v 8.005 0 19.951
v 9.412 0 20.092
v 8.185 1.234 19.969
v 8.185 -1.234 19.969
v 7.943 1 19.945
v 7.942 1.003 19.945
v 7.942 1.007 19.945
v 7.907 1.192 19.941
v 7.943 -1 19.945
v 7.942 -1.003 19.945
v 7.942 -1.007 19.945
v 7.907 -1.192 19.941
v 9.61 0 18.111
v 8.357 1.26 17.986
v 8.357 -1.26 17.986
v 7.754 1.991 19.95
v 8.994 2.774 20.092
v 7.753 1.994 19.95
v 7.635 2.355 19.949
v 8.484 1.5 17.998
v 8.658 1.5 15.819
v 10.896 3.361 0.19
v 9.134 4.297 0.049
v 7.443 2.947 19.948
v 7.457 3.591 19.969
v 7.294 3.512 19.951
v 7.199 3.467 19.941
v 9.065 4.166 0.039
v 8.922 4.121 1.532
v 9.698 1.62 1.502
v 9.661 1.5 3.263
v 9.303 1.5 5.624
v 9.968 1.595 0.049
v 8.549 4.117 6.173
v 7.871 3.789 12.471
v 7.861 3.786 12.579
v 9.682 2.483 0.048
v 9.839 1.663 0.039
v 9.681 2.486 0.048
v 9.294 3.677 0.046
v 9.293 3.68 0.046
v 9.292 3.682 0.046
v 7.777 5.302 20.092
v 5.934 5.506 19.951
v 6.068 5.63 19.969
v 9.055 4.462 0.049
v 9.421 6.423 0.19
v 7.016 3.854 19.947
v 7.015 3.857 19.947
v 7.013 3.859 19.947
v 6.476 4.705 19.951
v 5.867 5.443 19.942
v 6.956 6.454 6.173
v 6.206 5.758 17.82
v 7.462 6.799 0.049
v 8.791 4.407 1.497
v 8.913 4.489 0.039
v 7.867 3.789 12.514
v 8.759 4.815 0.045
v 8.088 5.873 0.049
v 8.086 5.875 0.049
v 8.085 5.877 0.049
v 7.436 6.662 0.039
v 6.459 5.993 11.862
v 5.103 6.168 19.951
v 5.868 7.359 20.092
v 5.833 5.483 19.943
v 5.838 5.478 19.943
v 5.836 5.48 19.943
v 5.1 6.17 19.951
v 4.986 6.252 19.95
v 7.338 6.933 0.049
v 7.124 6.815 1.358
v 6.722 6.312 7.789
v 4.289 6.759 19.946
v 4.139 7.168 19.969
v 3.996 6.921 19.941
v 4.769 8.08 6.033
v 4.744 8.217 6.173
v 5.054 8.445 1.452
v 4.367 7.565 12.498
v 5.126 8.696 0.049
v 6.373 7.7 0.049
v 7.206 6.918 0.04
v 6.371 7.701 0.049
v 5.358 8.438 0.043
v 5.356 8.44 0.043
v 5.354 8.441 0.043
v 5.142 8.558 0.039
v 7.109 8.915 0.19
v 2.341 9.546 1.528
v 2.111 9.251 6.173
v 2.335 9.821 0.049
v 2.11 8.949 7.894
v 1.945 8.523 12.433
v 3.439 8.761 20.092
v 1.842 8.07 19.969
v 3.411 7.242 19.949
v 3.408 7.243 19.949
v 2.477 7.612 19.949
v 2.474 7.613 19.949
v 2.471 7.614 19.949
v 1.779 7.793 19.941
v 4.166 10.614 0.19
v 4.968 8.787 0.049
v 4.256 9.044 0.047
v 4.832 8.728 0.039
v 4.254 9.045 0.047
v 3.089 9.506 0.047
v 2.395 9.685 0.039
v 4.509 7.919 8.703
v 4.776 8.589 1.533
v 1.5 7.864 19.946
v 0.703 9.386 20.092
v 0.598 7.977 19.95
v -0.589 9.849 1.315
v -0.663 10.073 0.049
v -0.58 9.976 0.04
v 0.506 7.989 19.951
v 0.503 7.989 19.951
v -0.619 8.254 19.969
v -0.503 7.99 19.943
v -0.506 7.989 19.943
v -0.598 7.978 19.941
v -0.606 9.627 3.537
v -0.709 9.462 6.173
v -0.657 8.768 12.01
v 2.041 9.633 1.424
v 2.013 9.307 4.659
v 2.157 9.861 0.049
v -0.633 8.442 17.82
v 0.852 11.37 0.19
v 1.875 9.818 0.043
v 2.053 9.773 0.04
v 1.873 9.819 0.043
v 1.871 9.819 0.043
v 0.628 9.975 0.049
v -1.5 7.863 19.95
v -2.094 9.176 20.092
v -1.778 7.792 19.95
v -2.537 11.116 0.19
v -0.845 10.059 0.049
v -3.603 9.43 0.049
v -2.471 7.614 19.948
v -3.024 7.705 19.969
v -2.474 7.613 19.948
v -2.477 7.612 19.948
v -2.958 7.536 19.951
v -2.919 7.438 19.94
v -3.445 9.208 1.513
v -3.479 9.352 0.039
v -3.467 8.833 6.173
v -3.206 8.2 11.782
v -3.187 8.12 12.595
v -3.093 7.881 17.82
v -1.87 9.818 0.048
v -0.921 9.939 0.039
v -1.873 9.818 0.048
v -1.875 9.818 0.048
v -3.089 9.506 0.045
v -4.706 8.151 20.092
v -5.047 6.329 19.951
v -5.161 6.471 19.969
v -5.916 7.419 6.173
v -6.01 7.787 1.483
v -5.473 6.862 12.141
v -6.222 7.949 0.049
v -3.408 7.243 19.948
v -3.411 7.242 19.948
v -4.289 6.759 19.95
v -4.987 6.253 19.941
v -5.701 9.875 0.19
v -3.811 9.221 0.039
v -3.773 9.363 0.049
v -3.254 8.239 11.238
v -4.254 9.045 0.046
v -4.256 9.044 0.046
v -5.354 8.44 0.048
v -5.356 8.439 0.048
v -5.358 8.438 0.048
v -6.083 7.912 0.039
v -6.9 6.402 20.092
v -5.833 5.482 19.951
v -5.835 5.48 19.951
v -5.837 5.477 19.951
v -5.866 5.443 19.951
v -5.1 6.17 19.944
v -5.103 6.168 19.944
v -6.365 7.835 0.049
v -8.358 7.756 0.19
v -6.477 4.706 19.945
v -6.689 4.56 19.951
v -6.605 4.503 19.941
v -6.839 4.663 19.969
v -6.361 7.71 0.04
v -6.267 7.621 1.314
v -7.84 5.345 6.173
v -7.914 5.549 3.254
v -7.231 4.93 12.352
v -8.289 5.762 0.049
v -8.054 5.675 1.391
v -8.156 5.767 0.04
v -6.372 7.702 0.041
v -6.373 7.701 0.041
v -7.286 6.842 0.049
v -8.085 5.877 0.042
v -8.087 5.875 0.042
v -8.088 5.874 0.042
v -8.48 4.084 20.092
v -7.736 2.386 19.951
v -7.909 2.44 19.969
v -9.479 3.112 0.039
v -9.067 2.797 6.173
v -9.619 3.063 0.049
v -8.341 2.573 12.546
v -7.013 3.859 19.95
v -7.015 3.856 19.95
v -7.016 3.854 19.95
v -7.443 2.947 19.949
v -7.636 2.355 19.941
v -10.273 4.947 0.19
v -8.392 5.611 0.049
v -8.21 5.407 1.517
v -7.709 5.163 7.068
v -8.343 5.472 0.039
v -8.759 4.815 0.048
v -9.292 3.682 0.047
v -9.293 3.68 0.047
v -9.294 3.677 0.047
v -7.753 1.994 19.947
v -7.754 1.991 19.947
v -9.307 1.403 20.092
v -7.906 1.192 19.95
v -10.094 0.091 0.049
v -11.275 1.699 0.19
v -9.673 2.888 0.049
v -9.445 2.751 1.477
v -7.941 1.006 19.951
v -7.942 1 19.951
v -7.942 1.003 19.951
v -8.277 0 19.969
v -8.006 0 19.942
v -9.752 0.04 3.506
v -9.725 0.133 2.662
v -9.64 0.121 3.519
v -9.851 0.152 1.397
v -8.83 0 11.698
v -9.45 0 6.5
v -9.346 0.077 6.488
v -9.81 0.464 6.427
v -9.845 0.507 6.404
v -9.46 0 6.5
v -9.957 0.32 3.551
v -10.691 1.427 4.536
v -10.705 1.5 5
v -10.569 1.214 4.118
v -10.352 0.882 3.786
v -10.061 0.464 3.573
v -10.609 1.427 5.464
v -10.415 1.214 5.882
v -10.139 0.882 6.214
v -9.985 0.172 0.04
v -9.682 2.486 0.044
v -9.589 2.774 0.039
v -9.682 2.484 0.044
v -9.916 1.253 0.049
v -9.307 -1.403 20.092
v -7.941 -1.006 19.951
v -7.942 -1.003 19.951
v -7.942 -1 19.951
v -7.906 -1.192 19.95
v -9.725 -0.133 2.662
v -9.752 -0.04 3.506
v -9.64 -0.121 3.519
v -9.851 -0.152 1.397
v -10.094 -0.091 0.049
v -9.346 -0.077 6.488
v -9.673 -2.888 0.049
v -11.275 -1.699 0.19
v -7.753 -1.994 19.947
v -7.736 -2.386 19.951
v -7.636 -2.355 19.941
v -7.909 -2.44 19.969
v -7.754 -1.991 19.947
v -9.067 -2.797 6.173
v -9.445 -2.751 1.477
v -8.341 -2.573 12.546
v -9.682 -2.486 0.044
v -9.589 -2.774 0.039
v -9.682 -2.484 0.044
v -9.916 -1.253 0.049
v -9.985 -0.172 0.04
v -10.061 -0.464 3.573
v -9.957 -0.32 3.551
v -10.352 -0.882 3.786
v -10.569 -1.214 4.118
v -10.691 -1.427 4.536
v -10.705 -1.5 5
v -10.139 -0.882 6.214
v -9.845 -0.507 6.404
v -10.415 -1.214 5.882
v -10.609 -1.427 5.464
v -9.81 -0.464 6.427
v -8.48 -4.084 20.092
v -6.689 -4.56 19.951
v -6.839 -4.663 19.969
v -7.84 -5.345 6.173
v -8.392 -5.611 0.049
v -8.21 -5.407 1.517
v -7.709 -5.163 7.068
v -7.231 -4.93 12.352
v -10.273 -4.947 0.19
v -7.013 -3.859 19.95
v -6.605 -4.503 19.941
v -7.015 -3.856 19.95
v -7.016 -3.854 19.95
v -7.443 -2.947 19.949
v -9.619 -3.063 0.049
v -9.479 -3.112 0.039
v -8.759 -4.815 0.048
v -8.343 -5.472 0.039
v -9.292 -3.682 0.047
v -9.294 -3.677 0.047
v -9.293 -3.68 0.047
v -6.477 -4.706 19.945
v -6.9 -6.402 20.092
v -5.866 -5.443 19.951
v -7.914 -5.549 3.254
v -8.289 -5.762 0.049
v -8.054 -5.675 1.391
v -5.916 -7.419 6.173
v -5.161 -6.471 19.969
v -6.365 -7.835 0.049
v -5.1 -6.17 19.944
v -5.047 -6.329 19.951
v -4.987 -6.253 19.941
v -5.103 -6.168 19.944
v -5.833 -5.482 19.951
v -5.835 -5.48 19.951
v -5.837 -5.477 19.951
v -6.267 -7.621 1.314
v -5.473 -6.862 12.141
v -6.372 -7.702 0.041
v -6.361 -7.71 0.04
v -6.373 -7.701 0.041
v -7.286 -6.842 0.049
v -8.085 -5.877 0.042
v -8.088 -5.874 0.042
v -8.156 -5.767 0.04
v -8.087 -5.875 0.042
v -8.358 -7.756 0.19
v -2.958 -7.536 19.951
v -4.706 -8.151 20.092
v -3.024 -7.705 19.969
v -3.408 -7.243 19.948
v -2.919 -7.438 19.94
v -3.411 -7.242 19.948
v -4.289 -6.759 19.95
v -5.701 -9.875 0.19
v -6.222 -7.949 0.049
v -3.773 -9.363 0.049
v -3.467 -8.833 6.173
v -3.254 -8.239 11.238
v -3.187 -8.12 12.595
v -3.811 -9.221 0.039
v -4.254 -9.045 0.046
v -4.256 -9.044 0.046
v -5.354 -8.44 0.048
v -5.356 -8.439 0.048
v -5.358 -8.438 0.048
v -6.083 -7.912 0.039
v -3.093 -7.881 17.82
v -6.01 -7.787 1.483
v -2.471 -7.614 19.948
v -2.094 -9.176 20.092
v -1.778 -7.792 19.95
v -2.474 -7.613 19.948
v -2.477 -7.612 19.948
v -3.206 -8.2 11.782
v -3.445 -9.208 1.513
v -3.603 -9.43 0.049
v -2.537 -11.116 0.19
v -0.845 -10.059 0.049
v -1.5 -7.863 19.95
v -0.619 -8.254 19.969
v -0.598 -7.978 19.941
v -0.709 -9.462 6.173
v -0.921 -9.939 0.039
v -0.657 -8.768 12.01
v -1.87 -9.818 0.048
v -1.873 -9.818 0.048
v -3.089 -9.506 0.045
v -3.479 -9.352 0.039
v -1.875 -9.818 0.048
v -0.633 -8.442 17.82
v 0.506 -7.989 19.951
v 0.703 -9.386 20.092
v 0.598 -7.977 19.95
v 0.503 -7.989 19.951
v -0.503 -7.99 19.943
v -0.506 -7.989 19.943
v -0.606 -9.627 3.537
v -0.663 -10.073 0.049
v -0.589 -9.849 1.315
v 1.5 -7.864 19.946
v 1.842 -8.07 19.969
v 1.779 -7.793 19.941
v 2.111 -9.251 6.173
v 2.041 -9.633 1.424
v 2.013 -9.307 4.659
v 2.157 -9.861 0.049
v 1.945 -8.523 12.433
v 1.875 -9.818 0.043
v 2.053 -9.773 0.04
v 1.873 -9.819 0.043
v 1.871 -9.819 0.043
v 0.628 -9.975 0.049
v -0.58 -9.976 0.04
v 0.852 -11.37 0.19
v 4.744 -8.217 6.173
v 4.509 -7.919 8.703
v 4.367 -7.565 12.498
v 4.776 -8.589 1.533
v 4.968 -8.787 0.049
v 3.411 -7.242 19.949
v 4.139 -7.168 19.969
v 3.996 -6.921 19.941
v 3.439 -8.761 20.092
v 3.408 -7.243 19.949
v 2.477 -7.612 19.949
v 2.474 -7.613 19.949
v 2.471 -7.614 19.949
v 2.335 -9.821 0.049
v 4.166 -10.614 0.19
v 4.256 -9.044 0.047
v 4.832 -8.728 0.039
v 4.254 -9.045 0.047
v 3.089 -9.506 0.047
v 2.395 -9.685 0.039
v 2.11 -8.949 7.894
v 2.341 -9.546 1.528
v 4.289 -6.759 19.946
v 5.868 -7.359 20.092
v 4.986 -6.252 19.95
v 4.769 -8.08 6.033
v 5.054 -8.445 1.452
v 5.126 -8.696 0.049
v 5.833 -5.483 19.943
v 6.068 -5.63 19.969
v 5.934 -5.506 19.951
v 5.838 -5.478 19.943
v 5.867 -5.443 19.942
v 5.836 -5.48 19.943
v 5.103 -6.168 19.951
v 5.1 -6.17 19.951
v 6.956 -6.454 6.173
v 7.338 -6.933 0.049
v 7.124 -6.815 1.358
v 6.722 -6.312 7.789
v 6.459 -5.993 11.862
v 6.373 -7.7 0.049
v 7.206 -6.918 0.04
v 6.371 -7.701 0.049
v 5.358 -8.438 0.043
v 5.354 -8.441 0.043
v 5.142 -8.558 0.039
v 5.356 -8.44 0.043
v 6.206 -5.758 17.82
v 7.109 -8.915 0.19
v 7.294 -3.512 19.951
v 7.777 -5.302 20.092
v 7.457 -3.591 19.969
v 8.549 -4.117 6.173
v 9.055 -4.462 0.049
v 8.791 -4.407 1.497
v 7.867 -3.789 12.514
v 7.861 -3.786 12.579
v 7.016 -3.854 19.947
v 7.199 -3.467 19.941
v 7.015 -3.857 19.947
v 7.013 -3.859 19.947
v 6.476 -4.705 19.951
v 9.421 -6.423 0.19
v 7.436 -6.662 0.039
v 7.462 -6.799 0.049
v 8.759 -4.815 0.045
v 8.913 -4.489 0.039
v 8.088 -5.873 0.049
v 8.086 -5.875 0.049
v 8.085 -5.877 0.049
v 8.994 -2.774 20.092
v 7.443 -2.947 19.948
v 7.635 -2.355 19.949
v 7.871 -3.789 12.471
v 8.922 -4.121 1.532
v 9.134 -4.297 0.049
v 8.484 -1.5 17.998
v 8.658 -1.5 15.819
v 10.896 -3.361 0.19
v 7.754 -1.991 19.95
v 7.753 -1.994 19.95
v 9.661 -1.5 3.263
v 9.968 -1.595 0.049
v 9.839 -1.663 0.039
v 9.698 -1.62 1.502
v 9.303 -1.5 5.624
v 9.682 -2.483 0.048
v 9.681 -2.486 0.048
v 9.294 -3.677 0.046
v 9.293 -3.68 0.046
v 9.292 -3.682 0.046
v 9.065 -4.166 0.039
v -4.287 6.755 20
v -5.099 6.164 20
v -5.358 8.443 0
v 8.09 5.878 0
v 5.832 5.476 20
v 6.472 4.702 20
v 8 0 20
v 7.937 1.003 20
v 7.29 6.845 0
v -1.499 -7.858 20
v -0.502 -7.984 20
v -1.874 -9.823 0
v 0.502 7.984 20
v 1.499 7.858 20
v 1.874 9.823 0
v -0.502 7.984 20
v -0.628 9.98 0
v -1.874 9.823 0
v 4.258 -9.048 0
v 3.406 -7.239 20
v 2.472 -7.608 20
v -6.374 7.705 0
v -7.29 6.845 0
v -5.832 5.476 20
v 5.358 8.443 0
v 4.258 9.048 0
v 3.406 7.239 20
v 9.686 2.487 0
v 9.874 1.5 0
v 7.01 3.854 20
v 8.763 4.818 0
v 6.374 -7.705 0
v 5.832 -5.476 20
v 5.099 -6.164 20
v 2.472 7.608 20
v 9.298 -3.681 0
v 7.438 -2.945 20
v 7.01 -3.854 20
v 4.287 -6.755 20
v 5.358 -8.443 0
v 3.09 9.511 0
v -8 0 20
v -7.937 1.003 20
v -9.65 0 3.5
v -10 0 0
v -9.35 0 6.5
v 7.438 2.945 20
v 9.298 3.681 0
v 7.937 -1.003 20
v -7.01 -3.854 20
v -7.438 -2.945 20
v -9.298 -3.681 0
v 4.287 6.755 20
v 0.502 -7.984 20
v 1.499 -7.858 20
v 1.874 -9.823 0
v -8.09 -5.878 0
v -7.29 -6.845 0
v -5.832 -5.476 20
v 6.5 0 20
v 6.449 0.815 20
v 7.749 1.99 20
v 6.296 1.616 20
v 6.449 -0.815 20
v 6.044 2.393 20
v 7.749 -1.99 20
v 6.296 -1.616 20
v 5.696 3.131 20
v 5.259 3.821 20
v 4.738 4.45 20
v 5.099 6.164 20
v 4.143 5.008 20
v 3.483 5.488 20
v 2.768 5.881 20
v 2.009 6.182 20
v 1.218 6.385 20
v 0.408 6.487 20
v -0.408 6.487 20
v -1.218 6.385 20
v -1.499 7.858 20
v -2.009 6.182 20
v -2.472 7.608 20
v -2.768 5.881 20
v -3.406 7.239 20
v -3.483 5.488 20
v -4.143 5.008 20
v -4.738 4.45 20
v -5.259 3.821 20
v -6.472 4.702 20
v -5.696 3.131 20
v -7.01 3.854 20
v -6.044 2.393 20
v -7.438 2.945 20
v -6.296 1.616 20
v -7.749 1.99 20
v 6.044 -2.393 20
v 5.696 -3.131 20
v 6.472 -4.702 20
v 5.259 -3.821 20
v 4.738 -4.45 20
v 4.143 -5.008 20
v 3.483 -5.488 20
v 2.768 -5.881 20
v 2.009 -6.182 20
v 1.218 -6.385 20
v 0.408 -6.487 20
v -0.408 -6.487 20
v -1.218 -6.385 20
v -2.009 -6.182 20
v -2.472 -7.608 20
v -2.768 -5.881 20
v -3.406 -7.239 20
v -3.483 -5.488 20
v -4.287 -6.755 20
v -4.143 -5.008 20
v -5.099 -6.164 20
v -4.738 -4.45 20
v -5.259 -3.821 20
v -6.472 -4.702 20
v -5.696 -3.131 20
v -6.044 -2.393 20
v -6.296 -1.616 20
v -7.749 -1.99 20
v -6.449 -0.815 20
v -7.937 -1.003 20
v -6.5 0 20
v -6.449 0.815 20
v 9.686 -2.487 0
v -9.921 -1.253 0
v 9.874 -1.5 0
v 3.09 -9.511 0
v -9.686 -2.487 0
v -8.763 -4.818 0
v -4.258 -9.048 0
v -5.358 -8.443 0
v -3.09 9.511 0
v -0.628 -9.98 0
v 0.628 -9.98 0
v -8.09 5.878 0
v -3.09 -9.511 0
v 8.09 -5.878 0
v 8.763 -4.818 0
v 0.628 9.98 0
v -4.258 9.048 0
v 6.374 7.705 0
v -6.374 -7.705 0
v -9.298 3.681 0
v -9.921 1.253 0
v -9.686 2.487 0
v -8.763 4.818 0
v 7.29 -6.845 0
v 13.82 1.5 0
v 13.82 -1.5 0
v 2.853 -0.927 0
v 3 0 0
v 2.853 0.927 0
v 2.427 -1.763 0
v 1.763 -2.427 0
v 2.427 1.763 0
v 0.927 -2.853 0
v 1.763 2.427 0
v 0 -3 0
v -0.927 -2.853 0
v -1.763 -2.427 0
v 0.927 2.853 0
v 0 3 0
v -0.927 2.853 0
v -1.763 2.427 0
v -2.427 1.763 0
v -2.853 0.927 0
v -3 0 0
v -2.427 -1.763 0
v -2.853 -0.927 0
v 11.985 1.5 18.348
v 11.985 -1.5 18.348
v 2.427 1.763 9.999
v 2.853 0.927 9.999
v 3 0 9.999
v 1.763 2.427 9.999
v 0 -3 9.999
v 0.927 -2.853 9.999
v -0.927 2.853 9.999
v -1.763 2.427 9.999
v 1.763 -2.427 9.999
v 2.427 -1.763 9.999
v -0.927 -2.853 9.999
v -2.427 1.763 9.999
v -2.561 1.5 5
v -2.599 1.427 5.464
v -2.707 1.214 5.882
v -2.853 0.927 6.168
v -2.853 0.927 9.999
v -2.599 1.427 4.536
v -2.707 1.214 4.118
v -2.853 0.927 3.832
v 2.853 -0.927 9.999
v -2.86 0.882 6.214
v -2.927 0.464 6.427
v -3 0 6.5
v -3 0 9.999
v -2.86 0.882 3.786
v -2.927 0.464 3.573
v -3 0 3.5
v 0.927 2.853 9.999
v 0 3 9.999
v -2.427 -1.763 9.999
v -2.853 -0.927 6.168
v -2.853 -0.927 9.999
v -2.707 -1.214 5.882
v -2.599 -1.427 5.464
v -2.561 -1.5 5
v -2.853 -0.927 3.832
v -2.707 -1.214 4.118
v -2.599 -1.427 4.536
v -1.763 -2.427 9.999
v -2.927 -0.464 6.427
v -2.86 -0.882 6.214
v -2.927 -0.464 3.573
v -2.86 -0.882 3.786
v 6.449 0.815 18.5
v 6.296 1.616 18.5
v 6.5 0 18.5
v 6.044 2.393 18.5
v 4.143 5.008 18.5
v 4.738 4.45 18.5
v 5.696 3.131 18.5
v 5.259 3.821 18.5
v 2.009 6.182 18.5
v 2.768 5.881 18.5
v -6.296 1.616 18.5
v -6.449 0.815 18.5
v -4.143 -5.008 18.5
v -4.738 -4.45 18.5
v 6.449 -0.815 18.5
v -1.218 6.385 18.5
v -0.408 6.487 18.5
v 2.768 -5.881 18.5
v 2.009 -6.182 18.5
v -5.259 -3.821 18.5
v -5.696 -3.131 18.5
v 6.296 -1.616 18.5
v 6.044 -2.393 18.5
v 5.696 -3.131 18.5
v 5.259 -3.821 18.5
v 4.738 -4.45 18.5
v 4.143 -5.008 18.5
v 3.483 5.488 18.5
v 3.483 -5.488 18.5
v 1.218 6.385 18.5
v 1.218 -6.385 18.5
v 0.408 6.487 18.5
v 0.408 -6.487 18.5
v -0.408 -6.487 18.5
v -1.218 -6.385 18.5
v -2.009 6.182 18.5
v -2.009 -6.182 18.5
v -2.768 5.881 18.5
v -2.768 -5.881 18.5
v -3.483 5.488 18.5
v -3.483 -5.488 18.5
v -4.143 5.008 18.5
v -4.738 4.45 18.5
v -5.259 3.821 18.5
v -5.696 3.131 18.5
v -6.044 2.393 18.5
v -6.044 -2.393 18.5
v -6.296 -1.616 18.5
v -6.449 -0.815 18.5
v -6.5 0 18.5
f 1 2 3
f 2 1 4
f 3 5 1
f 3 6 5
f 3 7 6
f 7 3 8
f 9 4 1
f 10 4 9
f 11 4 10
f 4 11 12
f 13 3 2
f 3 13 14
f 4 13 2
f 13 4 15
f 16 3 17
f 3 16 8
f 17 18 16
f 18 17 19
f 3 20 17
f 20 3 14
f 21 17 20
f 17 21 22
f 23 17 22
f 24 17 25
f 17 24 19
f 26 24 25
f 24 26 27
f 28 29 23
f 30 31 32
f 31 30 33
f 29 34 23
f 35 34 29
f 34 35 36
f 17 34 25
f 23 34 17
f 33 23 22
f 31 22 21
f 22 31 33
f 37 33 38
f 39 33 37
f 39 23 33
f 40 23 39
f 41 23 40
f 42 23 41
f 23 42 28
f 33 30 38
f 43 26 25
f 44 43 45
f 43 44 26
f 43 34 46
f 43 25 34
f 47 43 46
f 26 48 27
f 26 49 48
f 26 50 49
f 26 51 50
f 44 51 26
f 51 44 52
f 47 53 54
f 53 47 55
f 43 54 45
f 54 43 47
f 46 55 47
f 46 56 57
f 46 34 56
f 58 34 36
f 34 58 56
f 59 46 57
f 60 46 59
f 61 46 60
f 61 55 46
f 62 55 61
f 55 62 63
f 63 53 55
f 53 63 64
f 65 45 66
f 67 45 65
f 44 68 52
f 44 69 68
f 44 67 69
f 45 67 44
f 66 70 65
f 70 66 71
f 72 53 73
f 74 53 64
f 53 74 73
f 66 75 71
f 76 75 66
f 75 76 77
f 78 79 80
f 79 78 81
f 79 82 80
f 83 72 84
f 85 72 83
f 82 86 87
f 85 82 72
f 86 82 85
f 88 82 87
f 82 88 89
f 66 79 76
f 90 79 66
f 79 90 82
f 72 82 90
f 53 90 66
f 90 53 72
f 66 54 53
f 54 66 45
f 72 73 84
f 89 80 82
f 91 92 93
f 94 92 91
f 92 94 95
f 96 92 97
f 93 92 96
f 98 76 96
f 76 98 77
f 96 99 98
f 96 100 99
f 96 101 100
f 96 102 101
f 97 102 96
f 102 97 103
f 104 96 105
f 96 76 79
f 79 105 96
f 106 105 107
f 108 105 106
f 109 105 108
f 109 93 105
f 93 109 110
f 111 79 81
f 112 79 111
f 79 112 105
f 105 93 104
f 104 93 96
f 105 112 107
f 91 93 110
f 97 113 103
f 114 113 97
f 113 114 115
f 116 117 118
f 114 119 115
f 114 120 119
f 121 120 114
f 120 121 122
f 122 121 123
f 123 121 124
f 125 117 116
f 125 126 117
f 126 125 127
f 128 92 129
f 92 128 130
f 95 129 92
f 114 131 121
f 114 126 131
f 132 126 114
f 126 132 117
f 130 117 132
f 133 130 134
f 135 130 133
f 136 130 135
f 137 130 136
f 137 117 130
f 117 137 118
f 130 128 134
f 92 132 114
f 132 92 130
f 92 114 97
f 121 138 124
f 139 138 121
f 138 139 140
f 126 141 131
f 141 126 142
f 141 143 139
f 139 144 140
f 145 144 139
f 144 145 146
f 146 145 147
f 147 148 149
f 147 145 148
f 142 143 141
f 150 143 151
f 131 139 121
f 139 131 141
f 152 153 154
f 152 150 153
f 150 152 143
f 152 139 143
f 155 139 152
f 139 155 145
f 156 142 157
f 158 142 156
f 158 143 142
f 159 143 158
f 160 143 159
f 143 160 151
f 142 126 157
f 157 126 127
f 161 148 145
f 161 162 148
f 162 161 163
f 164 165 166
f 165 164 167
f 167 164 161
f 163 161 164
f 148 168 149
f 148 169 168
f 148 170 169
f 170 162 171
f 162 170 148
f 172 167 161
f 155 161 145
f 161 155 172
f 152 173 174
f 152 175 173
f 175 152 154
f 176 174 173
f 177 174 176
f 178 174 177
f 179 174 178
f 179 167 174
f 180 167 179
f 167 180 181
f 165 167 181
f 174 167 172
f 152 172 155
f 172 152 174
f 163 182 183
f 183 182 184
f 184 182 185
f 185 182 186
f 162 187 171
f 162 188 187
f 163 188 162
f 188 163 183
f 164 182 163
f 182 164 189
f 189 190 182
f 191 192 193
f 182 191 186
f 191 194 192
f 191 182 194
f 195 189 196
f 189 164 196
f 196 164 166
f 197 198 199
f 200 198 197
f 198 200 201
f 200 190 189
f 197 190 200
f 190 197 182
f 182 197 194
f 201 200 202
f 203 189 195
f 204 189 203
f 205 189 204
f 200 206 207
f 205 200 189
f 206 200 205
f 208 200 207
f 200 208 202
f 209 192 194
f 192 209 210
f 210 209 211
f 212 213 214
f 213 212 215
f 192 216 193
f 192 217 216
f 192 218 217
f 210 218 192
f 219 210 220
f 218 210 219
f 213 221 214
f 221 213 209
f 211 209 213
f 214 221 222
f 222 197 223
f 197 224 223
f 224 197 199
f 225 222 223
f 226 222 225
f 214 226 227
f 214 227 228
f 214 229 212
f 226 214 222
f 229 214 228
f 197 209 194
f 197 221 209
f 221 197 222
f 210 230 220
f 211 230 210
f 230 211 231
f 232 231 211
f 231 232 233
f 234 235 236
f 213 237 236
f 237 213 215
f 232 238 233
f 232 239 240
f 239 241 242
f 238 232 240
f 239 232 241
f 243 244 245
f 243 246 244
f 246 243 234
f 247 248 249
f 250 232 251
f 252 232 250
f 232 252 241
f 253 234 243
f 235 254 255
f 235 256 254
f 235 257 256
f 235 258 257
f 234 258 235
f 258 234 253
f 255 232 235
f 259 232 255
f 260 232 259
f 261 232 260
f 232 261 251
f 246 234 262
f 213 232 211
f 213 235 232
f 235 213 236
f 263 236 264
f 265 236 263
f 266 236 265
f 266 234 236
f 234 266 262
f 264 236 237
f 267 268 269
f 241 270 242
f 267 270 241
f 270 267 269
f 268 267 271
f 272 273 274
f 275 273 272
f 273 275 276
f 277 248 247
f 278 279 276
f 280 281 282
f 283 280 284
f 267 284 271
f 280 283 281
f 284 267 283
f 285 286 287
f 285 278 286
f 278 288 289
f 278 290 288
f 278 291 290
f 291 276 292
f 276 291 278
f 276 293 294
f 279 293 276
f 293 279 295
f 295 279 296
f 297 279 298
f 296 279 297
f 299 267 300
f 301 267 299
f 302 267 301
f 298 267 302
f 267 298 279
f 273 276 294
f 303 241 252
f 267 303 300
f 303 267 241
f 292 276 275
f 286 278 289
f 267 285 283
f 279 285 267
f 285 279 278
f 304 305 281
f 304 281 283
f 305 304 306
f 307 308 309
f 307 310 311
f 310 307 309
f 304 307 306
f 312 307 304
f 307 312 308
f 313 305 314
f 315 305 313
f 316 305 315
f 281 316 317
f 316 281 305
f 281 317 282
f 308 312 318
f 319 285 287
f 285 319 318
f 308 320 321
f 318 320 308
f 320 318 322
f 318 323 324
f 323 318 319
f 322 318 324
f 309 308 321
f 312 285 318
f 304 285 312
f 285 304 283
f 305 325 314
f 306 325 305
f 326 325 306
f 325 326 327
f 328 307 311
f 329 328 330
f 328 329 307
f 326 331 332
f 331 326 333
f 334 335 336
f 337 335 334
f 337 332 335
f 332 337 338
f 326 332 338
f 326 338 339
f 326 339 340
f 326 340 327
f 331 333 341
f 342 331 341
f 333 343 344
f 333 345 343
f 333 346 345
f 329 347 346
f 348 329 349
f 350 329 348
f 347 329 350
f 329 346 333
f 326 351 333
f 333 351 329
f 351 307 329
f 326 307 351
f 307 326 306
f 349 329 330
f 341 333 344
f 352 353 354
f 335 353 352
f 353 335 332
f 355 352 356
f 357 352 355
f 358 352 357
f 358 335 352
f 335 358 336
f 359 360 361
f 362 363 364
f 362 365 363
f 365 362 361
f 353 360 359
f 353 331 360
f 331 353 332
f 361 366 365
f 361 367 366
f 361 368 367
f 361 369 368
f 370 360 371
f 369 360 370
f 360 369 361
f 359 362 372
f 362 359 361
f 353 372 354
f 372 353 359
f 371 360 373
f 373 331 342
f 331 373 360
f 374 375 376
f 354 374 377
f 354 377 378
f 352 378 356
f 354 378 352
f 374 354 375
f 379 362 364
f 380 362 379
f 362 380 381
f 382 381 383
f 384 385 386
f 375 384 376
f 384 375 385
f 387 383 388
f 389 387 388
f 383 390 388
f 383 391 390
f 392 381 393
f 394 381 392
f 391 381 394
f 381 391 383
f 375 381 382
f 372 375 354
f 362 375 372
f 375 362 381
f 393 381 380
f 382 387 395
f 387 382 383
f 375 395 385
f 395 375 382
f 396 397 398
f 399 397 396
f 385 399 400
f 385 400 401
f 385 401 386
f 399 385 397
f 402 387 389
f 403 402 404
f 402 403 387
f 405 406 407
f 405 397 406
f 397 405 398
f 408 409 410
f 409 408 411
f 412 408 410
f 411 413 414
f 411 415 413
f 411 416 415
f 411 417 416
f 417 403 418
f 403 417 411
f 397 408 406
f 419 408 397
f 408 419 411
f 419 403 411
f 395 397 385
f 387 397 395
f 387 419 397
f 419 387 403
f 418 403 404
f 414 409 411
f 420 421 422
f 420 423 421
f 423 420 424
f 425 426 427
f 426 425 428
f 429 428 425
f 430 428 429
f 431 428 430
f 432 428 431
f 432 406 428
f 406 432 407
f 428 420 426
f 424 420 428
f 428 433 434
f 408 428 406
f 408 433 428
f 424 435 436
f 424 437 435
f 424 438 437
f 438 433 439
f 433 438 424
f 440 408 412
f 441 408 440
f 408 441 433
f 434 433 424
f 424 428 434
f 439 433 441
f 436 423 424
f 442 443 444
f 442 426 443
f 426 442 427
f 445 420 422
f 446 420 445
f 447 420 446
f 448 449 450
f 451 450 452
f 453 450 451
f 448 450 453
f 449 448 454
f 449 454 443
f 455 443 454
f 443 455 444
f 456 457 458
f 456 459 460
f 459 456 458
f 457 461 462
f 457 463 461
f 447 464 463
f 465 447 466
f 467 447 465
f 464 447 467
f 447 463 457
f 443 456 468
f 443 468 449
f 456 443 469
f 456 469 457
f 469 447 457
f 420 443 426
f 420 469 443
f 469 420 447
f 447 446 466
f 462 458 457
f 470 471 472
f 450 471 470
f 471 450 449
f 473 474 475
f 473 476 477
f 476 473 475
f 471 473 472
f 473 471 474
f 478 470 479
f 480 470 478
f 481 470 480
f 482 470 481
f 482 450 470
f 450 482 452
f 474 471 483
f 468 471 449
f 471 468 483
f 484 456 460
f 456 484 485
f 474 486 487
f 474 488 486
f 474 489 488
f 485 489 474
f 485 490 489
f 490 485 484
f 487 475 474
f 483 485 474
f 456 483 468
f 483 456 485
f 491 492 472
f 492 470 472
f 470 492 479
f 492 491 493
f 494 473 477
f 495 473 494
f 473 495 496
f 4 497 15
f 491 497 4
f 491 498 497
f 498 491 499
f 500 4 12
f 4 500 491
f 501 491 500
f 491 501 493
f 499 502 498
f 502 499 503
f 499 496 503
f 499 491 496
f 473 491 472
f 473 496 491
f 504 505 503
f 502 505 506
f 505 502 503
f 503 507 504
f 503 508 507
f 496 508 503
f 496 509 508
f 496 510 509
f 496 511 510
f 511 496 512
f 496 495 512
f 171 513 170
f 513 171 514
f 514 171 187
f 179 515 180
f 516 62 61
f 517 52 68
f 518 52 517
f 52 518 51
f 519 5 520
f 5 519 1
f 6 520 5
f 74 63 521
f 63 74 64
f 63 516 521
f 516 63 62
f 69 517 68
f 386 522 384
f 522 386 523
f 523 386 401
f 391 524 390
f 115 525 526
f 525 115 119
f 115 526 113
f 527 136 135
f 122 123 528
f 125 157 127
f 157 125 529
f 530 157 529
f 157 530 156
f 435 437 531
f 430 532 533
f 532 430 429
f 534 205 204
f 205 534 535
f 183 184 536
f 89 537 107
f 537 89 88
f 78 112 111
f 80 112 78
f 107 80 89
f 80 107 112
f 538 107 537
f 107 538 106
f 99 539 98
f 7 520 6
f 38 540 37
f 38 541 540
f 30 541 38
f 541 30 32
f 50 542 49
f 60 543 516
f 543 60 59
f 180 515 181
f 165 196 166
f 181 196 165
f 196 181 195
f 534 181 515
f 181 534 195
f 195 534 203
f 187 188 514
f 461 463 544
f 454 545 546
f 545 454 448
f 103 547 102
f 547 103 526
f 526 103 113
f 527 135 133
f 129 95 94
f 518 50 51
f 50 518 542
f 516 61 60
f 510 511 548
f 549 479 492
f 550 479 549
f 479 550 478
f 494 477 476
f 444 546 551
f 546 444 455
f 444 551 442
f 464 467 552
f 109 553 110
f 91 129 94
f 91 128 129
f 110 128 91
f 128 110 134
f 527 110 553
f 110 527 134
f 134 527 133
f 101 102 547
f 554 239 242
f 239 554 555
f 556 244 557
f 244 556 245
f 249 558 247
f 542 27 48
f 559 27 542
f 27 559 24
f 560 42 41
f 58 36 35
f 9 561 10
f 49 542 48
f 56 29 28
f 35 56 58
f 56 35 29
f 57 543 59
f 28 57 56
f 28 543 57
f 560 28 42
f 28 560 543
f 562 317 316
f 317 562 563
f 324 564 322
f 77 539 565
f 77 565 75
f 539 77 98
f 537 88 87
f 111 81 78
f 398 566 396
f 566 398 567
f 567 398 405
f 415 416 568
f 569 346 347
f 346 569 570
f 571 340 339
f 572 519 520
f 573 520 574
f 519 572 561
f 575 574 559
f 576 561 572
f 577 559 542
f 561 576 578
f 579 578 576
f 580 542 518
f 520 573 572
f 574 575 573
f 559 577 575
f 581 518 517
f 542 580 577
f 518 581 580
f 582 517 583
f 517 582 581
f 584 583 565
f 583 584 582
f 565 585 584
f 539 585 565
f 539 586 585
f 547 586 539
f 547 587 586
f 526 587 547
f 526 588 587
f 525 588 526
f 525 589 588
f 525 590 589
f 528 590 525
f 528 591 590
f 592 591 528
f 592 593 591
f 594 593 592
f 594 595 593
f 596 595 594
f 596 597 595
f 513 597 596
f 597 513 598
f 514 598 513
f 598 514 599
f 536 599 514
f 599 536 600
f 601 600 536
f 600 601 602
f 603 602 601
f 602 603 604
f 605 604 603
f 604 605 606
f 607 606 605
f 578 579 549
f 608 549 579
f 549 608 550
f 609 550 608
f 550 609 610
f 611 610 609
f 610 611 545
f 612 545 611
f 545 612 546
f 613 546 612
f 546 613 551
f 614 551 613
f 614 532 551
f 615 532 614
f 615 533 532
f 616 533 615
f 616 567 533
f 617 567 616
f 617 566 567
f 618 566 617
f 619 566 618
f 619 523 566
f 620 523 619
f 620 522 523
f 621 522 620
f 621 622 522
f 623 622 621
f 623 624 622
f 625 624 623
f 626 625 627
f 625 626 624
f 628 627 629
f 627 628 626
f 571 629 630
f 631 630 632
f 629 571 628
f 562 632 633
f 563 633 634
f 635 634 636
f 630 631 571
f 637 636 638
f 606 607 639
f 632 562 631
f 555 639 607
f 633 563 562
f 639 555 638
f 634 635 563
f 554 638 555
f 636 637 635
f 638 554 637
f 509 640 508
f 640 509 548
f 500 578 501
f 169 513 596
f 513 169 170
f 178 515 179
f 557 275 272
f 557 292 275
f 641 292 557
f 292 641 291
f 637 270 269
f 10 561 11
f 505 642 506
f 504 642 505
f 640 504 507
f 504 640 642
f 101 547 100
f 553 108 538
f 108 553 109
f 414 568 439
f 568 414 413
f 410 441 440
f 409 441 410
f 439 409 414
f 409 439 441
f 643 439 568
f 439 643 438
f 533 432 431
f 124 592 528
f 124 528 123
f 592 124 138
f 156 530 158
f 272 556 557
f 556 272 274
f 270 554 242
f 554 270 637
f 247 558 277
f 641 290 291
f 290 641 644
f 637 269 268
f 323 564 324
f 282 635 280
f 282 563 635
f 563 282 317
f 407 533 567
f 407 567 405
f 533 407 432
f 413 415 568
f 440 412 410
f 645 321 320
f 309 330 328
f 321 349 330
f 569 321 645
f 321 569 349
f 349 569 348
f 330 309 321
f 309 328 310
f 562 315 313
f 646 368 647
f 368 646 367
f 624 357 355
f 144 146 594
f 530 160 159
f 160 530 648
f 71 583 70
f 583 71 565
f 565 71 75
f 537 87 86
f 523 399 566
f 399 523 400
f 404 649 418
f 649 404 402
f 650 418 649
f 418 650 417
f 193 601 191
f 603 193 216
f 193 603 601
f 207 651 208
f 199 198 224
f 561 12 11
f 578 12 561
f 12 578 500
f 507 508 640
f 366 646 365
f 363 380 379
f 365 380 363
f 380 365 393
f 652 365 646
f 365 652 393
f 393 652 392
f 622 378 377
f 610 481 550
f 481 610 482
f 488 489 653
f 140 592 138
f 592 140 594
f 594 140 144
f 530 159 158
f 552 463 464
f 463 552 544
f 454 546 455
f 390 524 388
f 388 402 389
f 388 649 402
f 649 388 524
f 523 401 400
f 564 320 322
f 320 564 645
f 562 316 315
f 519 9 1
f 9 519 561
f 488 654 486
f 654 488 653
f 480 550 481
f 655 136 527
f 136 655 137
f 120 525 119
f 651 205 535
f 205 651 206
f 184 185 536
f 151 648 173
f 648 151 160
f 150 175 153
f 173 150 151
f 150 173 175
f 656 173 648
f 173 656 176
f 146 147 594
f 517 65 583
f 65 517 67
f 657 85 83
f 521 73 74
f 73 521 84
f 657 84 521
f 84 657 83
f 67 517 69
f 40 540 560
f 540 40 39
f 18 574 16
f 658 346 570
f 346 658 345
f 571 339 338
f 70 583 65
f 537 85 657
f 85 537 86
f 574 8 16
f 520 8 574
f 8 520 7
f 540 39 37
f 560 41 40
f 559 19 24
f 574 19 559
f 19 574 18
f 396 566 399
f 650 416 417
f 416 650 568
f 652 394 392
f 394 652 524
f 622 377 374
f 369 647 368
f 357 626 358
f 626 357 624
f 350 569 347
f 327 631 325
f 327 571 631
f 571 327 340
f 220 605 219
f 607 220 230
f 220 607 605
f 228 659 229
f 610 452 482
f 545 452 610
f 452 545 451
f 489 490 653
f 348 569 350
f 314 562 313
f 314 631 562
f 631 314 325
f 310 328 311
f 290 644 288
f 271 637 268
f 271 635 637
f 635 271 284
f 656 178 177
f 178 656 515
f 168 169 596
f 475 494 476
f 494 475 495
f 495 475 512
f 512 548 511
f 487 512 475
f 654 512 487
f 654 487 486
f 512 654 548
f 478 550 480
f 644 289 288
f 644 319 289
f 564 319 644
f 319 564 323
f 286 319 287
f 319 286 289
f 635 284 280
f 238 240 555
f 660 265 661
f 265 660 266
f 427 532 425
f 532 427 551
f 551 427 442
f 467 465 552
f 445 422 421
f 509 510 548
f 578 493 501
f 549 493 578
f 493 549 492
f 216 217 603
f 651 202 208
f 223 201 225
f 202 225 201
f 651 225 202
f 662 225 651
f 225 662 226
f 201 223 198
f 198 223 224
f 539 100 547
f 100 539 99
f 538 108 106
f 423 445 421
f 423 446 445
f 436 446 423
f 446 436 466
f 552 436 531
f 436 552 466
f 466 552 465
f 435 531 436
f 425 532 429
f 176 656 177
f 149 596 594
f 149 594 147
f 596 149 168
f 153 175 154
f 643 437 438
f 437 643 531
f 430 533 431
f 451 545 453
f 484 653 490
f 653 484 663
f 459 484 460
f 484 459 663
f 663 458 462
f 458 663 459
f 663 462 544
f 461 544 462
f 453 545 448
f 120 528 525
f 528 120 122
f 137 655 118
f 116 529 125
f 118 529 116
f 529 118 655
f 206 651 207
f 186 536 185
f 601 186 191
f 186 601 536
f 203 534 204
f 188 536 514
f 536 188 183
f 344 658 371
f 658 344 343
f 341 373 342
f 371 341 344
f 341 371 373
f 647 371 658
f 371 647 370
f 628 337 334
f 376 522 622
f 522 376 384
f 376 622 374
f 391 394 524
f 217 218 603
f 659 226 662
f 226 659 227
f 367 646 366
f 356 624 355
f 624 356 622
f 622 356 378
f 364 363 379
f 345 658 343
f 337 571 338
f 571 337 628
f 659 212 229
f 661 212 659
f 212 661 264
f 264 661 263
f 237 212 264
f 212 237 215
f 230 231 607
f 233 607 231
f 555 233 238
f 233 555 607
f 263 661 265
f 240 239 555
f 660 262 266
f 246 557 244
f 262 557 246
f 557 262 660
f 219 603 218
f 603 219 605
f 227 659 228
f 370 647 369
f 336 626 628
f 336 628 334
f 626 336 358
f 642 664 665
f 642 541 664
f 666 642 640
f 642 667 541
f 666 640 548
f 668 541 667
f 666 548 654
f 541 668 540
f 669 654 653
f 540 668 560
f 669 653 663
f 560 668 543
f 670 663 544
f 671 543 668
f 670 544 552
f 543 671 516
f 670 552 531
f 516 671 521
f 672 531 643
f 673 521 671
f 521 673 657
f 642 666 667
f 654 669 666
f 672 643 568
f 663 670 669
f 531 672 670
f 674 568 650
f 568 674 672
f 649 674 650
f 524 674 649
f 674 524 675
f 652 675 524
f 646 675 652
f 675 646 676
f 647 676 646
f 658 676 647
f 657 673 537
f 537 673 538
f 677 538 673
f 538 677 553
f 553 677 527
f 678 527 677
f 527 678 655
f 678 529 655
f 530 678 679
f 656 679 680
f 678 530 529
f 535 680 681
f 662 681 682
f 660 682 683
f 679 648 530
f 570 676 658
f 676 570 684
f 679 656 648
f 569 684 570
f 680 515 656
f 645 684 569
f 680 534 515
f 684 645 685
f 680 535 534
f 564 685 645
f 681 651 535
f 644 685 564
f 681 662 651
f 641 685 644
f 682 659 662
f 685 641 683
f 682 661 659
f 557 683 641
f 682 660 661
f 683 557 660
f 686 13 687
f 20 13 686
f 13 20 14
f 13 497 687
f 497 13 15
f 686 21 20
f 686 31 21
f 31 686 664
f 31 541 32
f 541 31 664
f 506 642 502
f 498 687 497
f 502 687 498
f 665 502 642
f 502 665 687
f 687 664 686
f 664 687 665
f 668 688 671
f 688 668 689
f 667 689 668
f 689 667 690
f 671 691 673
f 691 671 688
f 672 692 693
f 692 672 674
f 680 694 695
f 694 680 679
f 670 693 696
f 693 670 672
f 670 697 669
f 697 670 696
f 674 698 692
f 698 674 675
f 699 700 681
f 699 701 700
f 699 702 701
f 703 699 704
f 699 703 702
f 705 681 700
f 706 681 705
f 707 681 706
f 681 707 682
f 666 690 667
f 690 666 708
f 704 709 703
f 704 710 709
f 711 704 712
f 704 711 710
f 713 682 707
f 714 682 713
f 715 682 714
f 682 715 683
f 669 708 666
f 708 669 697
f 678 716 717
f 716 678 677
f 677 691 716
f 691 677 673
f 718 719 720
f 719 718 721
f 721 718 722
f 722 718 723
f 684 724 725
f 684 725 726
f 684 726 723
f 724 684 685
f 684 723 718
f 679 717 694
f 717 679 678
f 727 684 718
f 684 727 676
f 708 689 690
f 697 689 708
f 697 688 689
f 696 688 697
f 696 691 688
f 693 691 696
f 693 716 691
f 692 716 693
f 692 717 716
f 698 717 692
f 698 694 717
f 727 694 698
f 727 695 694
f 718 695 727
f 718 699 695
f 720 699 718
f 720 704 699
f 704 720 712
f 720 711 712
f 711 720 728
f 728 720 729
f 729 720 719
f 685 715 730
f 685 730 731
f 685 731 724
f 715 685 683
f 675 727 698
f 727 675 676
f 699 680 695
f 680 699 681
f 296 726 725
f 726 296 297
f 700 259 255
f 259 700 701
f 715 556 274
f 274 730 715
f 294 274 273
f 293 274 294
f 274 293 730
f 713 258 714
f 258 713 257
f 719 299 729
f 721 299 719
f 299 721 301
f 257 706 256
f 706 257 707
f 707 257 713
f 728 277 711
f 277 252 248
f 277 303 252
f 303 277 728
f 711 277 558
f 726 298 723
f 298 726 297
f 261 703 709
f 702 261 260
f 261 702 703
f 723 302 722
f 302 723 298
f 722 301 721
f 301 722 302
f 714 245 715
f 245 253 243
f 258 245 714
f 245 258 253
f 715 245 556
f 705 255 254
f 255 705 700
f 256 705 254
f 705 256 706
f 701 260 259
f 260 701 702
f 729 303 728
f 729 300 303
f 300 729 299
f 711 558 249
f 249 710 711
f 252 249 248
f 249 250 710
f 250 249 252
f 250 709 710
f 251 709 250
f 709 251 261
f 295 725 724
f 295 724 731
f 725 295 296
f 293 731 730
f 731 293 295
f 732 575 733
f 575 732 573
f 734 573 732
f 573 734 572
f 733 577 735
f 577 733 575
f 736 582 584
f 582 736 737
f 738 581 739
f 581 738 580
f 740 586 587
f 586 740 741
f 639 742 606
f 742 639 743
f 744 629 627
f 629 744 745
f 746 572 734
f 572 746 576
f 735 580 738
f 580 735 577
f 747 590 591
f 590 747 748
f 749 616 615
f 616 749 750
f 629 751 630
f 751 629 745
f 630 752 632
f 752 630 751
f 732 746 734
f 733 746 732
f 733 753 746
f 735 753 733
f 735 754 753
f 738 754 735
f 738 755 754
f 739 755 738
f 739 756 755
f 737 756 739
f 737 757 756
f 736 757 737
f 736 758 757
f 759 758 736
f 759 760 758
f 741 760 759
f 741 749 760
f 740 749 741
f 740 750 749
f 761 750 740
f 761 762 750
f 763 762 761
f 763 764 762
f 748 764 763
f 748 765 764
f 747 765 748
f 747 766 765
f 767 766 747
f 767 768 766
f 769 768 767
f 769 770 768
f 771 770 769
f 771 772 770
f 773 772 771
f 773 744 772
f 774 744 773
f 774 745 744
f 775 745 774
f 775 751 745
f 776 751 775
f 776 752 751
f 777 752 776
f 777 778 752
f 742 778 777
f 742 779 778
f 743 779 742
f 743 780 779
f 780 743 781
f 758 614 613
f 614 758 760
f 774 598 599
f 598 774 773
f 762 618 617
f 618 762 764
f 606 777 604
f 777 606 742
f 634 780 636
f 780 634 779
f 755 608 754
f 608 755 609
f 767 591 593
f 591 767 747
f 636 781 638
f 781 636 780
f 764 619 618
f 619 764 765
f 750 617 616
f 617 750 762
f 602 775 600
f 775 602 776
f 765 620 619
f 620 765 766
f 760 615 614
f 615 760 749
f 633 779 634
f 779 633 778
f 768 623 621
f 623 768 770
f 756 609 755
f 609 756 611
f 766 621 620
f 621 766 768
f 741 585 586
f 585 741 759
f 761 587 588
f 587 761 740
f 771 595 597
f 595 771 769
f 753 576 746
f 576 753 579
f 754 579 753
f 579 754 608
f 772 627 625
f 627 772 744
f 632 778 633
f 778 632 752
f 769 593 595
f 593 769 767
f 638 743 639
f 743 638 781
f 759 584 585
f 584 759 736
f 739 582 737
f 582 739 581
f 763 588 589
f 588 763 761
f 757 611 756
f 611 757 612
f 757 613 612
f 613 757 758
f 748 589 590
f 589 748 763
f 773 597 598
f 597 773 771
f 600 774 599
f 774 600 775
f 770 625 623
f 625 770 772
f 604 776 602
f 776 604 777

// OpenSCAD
// [FL_INDEX: keywords="openscad, 3d_parametric, Customizable_Knob, csg_solid" | COT="Parametric OpenSCAD design from 3DCodeverse"]
// Title: Customizable Knob!



//////////////////////////
// Customizable settings
//////////////////////////


// Diameter of the hole on the bottom (in mm).
HoleDiameter = 6;

// Depth of the hole in the bottom (in mm).  If you want the hole to go all the way through then set this to a number larger than the total height of the object.
HoleDepth = 10;

// If you want a D-shaped hole, set this to the thickness of the flat side (in mm).  Larger values for the flat make the hole smaller.
HoleFlatThickness = 0;

// Height (in mm).  If dome cap is selected, it is not included in height.  The shaft length is also not counted.
KnobHeight = 20;

// Diameter of base of round part of knob (in mm).  (Knurled ridges are not included in this measurement.)
KnobDiameter = 20;

// Shape of top of knob.  "Recessed" type can be painted.
CapType = 1;	// [0:Flat, 1:Recessed, 2:Dome]

// Do you want a large timer-knob style pointer?
TimerKnob=0;	// [0:No, 1:Yes]

// Would you like a divot on the top to indicate direction?
Pointer1 = 0;	// [0:No, 1:Yes]

// Would you like a line (pointer) on the front to indicate direction?
Pointer2 = 1;	// [0:No, 1:Yes]

// Do you want finger ridges around the knob?
Knurled = 1;	// [0:No, 1:Yes]

// 0 = A cylindrical knob, any other value will taper the knob.
TaperPercentage = 20;		// [0:0%, 10:10%, 20:20%, 30:30%, 40:40%, 50:50%]

// Width of "dial" ring (in mm).  Set to zero if you don't want the ring.
RingWidth = 0;

// The number of markings on the dial.  Set to zero if you don't want markings.  (RingWidth must be non-zero.)
RingMarkings = 10;

// diameter of the hole for the setscrew (in mm).  If you don't need a hole, set this to zero.
ScrewHoleDiameter = 3;

// Length of the shaft on the bottom of the knob (in mm).  If you don't want a shaft, set this value to zero.
ShaftLength = 0;

// Diameter of the shaft on the bottom of the knob (in mm).  (ShaftLength must be non-zero.)
ShaftDiameter = 10;

// Would you like a notch in the shaft?  It can be used for a press-on type knob (rather than using a setscrew).  (ShaftLength must be non-zero.)
NotchedShaft = 0;	// [0:No, 1:Yes]



//////////////////////////
//Advanced settings
//////////////////////////

RingThickness = 5*1;
DivotDepth = 1.5*1;
MarkingWidth = 1.5*1;
DistanceBetweenKnurls = 3*1;
TimerKnobConst = 1.8*1;



//////////////////////////
//Calculations
//////////////////////////

PI=3.14159265*1;
KnobMajorRadius = KnobDiameter/2;
KnobMinorRadius = KnobDiameter/2 * (1 - TaperPercentage/100);
KnobRadius = KnobMinorRadius + (KnobMajorRadius-KnobMinorRadius)/2;
KnobCircumference = PI*KnobDiameter;
Knurls = round(KnobCircumference/DistanceBetweenKnurls);
Divot=CapType;

TaperAngle=asin(KnobHeight / (sqrt(pow(KnobHeight, 2) +
		pow(KnobMajorRadius-KnobMinorRadius,2)))) - 90;

DivotRadius = KnobMinorRadius*.4;


union()
{
translate([0, 0, (ShaftLength==0)? 0 : ShaftLength-0.001])
difference()
{
union()
{
	// Primary knob cylinder
	cylinder(h=KnobHeight, r1=KnobMajorRadius, r2=KnobMinorRadius,
			$fn=50);
	
	if (Knurled)
		for (i=[0 : Knurls-1])
			rotate([0, 0, i * (360/Knurls)])
				translate([KnobRadius, 0, KnobHeight/2])
					rotate([0, TaperAngle, 0]) rotate([0, 0, 45])
						cube([2, 2, KnobHeight+.001], center=true);

 	if (RingMarkings>0)
		for (i=[0 : RingMarkings-1])
			rotate([0, 0, i * (360/RingMarkings)])
				translate([KnobMajorRadius + RingWidth/2, 0, 1])
					cube([RingWidth*.5, MarkingWidth, 2], center=true);		
	
	if (Pointer2==1)
		translate([KnobRadius, 0, KnobHeight/2-2])
			rotate([0, TaperAngle, 0])
				cube([8, 3, KnobHeight], center=true);		

	if (RingWidth>0)
		translate([0, 0, RingThickness/2])
			cylinder(r1=KnobMajorRadius + RingWidth, r2=KnobMinorRadius,
					h=RingThickness, $fn=50, center=true);

	if (Divot==2)
		translate([0, 0, KnobHeight])
			difference()
			{
				scale([1, 1, 0.5])
					sphere(r=KnobMinorRadius, $fn=50, center=true);

				translate([0, 0, 0-(KnobMinorRadius+.001)])
					cube([KnobMinorRadius*2.5, KnobMinorRadius*2.5,
							KnobMinorRadius*2], center=true);
			}

	if (TimerKnob==1) intersection()
		{
			translate([0, 0, 0-(KnobDiameter*TimerKnobConst) + KnobHeight])
			sphere(r=KnobDiameter*TimerKnobConst, $fn=50, center=true);		
	
			translate([0-(KnobDiameter*TimerKnobConst)*0.1, 0,
					KnobHeight/2])
				scale([1, 0.5, 1])
					cylinder(h=KnobHeight, r=(KnobDiameter*TimerKnobConst) *
							0.8, $fn=3, center=true);
		}
}

// Pointer1: Offset hemispherical divot
if (Pointer1==1)
	translate([KnobMinorRadius*.55, 0, KnobHeight + DivotRadius*.6])
		sphere(r=DivotRadius, $fn=40);

// Divot1: Centered cylynrical divot
if (Divot==1)
	translate([0, 0, KnobHeight])
		cylinder(h=DivotDepth*2, r=KnobMinorRadius-1.5, $fn=50,
				center=true);

if (ShaftLength==0)
{
	// Hole for shaft
	translate([0, 0, HoleDepth/2 - 0.001])
		difference()
		{
			cylinder(r=HoleDiameter/2, h=HoleDepth, $fn=20,
					center=true);
	
			// Flat for D-shaped hole
			translate([(0-HoleDiameter)+HoleFlatThickness, 0, 0])
				cube([HoleDiameter, HoleDiameter, HoleDepth+.001],
						center=true);
		}
	
	// Hole for setscrew
	if (ScrewHoleDiameter>0)
		translate([0 - (KnobMajorRadius+RingWidth+1)/2, 0,
				HoleDepth/2])
			rotate([0, 90, 0])
			cylinder(h=(KnobMajorRadius+RingWidth+1),
					r=ScrewHoleDiameter/2, $fn=20, center=true);
}

// Make sure bottom ends at z=0
translate([0, 0, -10])
	cube([(KnobMajorRadius+RingWidth) * 3,
			(KnobMajorRadius+RingWidth) * 3, 20], center=true);
}

if (ShaftLength>0)
	difference()
	{
		translate([0, 0, ShaftLength/2])
			cylinder(h=ShaftLength, r=ShaftDiameter/2, $fn=20,
					center=true);

		if (NotchedShaft==1)
		{
			cube([HoleDiameter/2, ShaftDiameter*2, ShaftLength],
					center=true);
		}

		// Hole for shaft
		translate([0, 0, HoleDepth/2 - 0.001])
			difference()
			{
				cylinder(r=HoleDiameter/2, h=HoleDepth, $fn=20,
						center=true);
		
				// Flat for D-shaped hole
				translate([(0-HoleDiameter)+HoleFlatThickness, 0, 0])
					cube([HoleDiameter, HoleDiameter, HoleDepth+.001],
							center=true);
			}
		
		// Hole for setscrew
		if (ScrewHoleDiameter>0)
			translate([0 - (KnobMajorRadius+RingWidth+1)/2, 0,
					HoleDepth/2])
				rotate([0, 90, 0])
				cylinder(h=(KnobMajorRadius+RingWidth+1),
						r=ScrewHoleDiameter/2, $fn=20, center=true);
	}
}
